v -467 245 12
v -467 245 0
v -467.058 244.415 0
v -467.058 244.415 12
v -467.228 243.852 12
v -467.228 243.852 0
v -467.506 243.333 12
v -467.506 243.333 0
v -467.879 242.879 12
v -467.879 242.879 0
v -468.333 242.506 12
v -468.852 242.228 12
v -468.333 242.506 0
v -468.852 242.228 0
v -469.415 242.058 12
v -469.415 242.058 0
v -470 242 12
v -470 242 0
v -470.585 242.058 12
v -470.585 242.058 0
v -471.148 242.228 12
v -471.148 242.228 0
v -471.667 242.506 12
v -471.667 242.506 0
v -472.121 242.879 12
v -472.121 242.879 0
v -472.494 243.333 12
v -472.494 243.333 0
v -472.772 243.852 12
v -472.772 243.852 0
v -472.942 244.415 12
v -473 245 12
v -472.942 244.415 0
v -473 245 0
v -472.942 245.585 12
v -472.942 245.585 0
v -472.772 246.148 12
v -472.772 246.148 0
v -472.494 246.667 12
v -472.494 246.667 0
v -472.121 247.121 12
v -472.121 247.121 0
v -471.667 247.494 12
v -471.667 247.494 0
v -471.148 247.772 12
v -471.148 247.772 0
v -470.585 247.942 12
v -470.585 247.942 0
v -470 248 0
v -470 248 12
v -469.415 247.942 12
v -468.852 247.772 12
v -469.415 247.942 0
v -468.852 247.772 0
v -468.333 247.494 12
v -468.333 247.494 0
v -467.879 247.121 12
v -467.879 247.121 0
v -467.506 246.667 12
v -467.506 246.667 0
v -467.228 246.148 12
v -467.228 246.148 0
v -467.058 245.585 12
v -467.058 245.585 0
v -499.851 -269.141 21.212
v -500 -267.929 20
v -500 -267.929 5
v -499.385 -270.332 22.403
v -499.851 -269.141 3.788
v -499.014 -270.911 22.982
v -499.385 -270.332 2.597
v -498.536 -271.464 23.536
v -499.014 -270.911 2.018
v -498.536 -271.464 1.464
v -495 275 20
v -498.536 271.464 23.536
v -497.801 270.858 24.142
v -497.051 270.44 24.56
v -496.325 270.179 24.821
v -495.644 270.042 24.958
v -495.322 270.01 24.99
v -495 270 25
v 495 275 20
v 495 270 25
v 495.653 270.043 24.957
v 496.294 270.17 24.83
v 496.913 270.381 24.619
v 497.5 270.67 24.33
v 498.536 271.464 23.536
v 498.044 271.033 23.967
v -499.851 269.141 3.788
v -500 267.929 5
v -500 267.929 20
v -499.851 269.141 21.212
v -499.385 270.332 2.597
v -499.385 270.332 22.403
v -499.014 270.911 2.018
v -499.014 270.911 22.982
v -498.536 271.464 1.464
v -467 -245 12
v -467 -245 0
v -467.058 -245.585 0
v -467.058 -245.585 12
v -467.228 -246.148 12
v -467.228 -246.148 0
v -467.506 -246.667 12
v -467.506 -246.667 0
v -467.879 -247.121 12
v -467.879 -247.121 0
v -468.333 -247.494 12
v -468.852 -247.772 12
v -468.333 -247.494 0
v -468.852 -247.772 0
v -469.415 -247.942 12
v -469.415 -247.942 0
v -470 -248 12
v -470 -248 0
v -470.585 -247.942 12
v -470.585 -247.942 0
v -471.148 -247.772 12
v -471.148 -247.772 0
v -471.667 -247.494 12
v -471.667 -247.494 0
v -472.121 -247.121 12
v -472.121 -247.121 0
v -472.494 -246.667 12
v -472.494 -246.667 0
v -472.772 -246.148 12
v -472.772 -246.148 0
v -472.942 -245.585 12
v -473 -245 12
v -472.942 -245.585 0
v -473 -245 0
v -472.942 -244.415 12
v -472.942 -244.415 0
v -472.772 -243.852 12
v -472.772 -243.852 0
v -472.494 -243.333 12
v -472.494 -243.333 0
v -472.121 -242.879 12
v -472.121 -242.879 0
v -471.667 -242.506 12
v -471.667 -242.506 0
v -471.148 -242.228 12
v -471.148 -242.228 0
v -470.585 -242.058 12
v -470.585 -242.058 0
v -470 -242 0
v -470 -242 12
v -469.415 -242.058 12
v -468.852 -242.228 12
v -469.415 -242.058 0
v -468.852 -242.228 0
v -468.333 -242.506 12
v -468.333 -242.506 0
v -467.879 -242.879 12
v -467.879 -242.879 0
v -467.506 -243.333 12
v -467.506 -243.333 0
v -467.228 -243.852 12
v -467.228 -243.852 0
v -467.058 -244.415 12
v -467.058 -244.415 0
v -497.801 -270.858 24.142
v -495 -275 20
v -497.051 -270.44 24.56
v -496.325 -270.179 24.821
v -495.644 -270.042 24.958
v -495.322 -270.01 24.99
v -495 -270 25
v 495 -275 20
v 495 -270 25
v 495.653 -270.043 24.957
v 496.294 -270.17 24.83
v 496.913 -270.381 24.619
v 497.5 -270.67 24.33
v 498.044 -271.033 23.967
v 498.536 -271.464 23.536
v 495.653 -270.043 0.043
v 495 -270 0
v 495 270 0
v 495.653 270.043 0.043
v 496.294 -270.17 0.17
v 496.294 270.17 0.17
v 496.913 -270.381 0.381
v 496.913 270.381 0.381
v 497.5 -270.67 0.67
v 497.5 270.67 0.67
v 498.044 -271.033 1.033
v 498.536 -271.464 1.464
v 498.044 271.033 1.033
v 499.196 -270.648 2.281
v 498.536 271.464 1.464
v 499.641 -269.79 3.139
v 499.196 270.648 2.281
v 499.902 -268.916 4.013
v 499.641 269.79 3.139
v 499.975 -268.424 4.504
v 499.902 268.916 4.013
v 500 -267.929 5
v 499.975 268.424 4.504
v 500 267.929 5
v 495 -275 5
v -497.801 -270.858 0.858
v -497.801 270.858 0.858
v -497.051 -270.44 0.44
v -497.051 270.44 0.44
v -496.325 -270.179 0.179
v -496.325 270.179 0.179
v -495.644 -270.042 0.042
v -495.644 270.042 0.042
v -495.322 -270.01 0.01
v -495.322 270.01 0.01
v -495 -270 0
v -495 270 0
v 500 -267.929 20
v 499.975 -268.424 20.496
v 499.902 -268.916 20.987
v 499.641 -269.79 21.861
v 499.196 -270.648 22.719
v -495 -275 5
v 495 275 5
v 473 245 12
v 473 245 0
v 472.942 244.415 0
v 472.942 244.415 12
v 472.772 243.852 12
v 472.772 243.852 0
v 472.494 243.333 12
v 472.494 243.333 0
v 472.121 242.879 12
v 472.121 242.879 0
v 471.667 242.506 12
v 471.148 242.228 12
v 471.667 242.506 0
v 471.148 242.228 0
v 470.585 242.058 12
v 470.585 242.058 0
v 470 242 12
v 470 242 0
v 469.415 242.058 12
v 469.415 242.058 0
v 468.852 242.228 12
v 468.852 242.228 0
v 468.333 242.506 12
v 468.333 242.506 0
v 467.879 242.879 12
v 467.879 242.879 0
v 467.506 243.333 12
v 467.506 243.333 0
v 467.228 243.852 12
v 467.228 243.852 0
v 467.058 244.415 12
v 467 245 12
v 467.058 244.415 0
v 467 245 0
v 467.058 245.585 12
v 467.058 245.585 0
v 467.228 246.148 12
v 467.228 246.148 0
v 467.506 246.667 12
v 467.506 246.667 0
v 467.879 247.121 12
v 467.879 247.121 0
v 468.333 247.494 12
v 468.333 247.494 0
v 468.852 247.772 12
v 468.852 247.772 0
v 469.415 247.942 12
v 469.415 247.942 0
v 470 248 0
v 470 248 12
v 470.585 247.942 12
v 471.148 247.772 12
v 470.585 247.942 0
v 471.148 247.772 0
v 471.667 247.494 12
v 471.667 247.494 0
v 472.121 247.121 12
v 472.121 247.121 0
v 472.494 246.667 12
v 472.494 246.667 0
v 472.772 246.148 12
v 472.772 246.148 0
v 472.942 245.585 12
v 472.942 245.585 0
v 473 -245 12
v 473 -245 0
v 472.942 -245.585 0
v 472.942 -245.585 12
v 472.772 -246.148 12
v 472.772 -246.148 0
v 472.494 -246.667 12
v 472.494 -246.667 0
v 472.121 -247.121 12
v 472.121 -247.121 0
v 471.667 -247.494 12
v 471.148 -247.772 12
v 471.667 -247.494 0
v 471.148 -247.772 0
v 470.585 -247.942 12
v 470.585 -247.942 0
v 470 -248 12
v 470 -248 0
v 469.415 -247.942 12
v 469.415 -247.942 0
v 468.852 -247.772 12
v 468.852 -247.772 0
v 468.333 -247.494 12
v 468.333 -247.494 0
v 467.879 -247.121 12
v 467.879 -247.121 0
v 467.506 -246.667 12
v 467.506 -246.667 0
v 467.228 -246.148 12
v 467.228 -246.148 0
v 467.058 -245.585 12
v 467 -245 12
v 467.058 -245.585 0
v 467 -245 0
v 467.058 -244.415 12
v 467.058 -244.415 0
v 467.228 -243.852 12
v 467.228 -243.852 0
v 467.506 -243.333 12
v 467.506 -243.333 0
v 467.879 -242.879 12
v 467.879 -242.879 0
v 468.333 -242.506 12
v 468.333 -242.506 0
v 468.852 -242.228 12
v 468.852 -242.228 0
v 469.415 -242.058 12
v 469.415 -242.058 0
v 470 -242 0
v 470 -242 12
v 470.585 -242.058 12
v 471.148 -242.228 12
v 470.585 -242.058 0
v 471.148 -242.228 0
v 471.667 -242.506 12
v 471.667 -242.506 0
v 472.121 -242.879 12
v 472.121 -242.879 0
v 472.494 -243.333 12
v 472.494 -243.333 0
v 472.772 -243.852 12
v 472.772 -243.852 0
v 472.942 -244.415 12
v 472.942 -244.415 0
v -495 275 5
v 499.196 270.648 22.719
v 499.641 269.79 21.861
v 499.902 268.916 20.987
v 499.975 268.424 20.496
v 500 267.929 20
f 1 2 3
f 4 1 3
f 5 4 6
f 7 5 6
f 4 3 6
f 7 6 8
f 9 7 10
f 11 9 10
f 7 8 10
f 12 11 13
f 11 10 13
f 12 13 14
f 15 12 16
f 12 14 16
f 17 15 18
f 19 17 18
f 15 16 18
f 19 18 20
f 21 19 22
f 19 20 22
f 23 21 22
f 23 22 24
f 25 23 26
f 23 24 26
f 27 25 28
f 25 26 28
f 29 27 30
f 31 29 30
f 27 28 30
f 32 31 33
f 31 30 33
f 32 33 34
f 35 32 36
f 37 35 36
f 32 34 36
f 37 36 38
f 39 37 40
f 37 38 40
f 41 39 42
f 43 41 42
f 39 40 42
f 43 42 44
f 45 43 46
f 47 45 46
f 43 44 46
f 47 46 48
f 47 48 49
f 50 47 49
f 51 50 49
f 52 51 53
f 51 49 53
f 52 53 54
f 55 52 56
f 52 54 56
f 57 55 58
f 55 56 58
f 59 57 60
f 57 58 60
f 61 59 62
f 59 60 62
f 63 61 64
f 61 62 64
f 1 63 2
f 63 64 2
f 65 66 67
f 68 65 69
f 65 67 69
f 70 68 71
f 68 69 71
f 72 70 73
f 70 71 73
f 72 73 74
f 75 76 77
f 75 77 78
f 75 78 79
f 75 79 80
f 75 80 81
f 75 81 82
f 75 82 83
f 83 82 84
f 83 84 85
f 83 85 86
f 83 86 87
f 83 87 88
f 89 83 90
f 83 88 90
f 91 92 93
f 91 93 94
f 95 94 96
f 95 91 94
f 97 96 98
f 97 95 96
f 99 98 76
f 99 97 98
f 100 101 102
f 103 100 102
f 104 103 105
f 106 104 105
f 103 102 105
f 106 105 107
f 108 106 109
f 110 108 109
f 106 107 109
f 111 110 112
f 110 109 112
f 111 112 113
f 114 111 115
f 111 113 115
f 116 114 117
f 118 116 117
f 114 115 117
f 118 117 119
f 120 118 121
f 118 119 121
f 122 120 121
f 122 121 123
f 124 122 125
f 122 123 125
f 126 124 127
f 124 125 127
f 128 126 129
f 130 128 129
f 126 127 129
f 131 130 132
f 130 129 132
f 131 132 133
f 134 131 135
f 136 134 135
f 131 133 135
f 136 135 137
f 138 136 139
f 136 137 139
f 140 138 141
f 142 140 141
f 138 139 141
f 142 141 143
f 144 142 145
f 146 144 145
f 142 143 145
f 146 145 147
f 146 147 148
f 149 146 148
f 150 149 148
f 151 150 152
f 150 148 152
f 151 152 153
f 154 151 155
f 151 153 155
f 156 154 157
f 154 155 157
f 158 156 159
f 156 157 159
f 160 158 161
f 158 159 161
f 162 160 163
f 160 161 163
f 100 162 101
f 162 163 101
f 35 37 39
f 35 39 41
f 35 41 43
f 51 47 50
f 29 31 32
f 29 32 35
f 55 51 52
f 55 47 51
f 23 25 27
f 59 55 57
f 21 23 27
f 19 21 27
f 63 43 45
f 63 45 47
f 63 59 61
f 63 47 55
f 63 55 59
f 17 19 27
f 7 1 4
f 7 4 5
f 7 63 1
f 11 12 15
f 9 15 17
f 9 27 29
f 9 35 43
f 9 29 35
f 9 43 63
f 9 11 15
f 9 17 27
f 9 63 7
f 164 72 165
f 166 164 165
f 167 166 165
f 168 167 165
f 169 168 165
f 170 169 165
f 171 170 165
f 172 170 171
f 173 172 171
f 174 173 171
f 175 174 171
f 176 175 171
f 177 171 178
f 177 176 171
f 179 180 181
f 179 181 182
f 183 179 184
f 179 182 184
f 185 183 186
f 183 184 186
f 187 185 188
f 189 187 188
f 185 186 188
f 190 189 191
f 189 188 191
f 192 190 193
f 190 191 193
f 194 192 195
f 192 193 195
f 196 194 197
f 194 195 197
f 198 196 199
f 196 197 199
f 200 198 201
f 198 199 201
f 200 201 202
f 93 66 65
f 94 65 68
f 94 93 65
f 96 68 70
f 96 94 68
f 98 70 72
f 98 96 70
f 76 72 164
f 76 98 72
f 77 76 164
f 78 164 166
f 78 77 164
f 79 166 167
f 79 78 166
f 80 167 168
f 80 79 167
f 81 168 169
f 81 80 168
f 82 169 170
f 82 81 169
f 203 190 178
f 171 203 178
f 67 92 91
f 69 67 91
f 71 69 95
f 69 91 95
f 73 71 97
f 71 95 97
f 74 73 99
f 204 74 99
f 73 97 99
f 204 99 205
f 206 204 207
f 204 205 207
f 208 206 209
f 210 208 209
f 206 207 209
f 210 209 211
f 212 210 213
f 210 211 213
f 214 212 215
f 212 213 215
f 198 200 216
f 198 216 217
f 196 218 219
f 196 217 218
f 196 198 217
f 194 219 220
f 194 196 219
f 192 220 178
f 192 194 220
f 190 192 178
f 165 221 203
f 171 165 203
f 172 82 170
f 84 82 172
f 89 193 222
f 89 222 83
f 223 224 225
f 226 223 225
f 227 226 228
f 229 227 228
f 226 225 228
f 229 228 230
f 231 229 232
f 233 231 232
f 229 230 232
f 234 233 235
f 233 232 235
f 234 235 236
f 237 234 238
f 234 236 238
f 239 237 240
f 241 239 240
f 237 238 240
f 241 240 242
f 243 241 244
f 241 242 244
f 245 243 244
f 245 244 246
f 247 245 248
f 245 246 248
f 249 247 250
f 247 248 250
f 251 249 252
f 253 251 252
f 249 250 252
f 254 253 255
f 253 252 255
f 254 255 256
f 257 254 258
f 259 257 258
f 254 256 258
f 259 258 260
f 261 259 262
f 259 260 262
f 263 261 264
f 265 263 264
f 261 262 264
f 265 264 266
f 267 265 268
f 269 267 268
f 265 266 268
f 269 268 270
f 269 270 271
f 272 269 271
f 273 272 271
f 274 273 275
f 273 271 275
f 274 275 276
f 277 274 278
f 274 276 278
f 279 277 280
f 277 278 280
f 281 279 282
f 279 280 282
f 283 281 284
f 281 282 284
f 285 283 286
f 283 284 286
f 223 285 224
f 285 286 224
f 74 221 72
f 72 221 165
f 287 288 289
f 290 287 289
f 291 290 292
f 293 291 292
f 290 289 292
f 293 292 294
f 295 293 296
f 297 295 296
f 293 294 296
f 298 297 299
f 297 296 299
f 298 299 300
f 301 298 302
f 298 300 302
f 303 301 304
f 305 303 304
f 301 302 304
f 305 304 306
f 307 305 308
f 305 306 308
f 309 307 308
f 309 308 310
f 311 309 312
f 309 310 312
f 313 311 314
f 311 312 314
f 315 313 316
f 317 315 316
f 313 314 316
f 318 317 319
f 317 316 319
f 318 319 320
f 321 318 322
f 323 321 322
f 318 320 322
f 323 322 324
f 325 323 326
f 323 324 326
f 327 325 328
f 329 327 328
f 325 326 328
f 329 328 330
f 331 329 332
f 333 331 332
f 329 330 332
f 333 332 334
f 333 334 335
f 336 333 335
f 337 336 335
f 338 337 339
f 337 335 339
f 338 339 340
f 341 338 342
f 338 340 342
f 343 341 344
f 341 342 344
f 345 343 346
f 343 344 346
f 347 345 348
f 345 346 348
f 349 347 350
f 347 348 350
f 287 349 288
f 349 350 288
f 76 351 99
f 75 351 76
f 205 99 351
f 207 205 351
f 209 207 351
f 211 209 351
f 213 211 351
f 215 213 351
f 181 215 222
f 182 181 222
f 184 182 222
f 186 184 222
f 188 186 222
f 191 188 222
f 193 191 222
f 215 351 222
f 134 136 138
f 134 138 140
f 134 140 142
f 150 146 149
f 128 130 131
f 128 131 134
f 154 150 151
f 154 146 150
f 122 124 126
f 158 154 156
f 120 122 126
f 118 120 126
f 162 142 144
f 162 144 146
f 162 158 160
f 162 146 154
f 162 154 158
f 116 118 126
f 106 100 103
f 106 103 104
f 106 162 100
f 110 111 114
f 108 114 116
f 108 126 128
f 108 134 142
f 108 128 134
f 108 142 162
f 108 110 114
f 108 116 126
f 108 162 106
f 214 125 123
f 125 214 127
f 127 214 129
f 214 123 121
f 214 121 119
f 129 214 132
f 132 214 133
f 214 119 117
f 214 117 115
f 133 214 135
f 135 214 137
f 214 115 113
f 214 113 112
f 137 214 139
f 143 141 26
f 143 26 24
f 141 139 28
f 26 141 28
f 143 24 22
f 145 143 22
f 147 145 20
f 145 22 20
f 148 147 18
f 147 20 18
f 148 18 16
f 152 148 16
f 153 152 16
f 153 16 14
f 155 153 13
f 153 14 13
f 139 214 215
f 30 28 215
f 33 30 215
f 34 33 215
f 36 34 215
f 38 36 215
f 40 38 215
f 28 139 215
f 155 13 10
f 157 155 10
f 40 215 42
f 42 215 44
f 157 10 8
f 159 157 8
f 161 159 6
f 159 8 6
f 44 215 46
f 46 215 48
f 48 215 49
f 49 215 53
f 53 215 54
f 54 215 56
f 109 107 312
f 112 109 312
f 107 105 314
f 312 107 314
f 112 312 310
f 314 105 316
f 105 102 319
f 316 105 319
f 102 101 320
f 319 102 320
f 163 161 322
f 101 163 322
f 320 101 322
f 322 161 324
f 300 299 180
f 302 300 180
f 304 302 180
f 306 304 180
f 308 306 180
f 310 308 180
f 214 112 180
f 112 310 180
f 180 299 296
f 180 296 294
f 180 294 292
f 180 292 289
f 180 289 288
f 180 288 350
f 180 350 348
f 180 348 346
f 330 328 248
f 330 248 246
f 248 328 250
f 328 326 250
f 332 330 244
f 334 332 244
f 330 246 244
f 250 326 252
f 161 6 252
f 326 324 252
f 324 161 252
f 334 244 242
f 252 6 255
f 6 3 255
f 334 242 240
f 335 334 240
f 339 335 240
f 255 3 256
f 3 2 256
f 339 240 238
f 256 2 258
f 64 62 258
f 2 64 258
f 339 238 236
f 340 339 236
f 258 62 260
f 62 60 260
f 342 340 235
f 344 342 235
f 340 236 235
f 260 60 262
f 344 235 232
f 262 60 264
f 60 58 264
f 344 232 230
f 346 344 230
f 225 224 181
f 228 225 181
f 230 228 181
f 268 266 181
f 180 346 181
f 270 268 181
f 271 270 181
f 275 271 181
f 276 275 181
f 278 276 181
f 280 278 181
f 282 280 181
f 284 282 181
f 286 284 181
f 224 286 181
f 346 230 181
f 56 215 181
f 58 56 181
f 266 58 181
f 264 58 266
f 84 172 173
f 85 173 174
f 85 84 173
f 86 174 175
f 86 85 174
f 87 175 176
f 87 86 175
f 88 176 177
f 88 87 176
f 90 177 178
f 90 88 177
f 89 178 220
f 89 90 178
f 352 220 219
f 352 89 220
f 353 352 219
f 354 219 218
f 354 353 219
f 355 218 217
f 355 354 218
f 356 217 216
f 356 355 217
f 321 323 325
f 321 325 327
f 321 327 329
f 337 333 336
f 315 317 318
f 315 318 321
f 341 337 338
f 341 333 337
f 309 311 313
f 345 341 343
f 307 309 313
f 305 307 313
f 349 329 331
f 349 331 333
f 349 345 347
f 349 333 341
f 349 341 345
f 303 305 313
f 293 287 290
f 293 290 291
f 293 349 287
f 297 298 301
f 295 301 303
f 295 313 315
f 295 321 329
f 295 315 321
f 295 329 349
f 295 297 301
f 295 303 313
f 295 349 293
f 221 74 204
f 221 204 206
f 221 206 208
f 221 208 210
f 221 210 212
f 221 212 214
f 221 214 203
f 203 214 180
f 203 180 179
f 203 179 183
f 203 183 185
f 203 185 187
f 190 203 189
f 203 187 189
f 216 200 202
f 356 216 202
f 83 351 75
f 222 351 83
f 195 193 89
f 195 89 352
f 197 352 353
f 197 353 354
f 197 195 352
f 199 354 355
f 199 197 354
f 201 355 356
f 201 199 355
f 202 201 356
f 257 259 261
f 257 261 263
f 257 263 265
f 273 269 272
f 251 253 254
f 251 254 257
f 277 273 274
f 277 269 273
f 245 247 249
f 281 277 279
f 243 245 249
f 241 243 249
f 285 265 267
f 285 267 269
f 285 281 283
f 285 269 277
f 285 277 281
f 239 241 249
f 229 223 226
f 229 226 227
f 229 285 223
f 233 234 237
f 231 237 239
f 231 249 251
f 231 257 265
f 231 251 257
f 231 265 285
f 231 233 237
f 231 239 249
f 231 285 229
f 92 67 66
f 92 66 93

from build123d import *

# Parameters (mm, degrees)
F0_W        = 1000
F0_H        = 550
F1_DEPTH    = 25
F2_SIZE     = 5
F3_SIZE     = 5
F4_T1_DEPTH = 565
F4_T3_DEPTH = 35.3553390593
F5_T1_DEPTH = 565
F5_T3_DEPTH = 35.3553390593
F6_R        = 3
F7_DEPTH    = 12
F8_R        = 3
F9_DEPTH    = 12
F10_R       = 3
F11_DEPTH   = 12
F12_R       = 3
F13_DEPTH   = 12


# Not quite as in the source:
# - a fillet or chamfer that OpenCascade refuses, or shapes differently, is made with other operations: its cross-section is extruded or revolved along the edge and cut away or added


with BuildPart() as f1:
    # F0 (on Top) → F1 (new body)
    with BuildSketch(Plane.XY):
        Rectangle(F0_W, F0_H)
    extrude(amount=F1_DEPTH)

    # F2
    f2_edges = [f1.edges().sort_by_distance(p)[0] for p in [
        (-500, -275, 12.5),
        (500, -275, 12.5),
        (0, -275, 0),
        (0, -275, 25),
    ]]
    chamfer(f2_edges, length=F2_SIZE)

    # F3
    f3_edges = [f1.edges().sort_by_distance(p)[0] for p in [
        (500, 275, 12.5),
        (-500, 275, 12.5),
        (0, 275, 0),
        (0, 275, 25),
    ]]
    chamfer(f3_edges, length=F3_SIZE)

    # F4: fillet of radius 5 on 4 edges, made by hand

    # F4_s2 → F4_t1 (cut)
    with BuildSketch(Plane.XZ.offset(-282.5)):
        with BuildLine():
            ThreePointArc((-500, 5), (-498.5355339059, 1.4644660941), (-495, 0))
            Line((-495, 0), (-500, 0))
            Line((-500, 0), (-500, 5))
        make_face()
        with BuildLine():
            ThreePointArc((-500, 20), (-498.5355339059, 23.5355339059), (-495, 25))
            Line((-495, 25), (-500, 25))
            Line((-500, 25), (-500, 20))
        make_face()
    extrude(amount=F4_T1_DEPTH, mode=Mode.SUBTRACT)

    # F4_s4 → F4_t3 (cut)
    with BuildSketch(Plane.XY.offset(-5.1776695297)):
        with BuildLine():
            ThreePointArc((-500, 267.9289321881), (-499.6193976626, 269.84234935), (-498.5355339059, 271.4644660941))
            Line((-498.5355339059, 271.4644660941), (-500, 270))
            Line((-500, 270), (-500, 267.9289321881))
        make_face()
        with BuildLine():
            ThreePointArc((-500, -267.9289321881), (-499.6193976626, -269.84234935), (-498.5355339059, -271.4644660941))
            Line((-498.5355339059, -271.4644660941), (-500, -270))
            Line((-500, -270), (-500, -267.9289321881))
        make_face()
    extrude(amount=F4_T3_DEPTH, mode=Mode.SUBTRACT)

    # F5: fillet of radius 5 on 4 edges, made by hand

    # F5_s2 → F5_t1 (cut)
    with BuildSketch(Plane.XZ.offset(-282.5)):
        with BuildLine():
            ThreePointArc((495, 0), (498.5355339059, 1.4644660941), (500, 5))
            Line((500, 5), (500, 0))
            Line((500, 0), (495, 0))
        make_face()
        with BuildLine():
            ThreePointArc((495, 25), (498.5355339059, 23.5355339059), (500, 20))
            Line((500, 20), (500, 25))
            Line((500, 25), (495, 25))
        make_face()
    extrude(amount=F5_T1_DEPTH, mode=Mode.SUBTRACT)

    # F5_s4 → F5_t3 (cut)
    with BuildSketch(Plane.XY.offset(-5.1776695297)):
        with BuildLine():
            ThreePointArc((498.5355339059, 271.4644660941), (499.6193976626, 269.84234935), (500, 267.9289321881))
            Line((500, 267.9289321881), (500, 270))
            Line((500, 270), (498.5355339059, 271.4644660941))
        make_face()
        with BuildLine():
            ThreePointArc((500, -267.9289321881), (499.6193976626, -269.84234935), (498.5355339059, -271.4644660941))
            Line((498.5355339059, -271.4644660941), (500, -270))
            Line((500, -270), (500, -267.9289321881))
        make_face()
    extrude(amount=F5_T3_DEPTH, mode=Mode.SUBTRACT)

    # F6 (on face) → F7 (cut)
    with BuildSketch(Plane(origin=(0, 0, 0), x_dir=(1, 0, 0), z_dir=(0, 0, -1))):
        with Locations((470, 245)):
            Circle(F6_R)
    extrude(amount=-F7_DEPTH, mode=Mode.SUBTRACT)

    # F8 (on face) → F9 (cut)
    with BuildSketch(Plane(origin=(0, 0, 0), x_dir=(1, 0, 0), z_dir=(0, 0, -1))):
        with Locations((470, -245)):
            Circle(F8_R)
    extrude(amount=-F9_DEPTH, mode=Mode.SUBTRACT)

    # F10 (on face) → F11 (cut)
    with BuildSketch(Plane(origin=(0, 0, 0), x_dir=(1, 0, 0), z_dir=(0, 0, -1))):
        with Locations((-470, 245)):
            Circle(F10_R)
    extrude(amount=-F11_DEPTH, mode=Mode.SUBTRACT)

    # F12 (on face) → F13 (cut)
    with BuildSketch(Plane(origin=(0, 0, 0), x_dir=(1, 0, 0), z_dir=(0, 0, -1))):
        with Locations((-470, -245)):
            Circle(F12_R)
    extrude(amount=-F13_DEPTH, mode=Mode.SUBTRACT)


solid = f1.part
